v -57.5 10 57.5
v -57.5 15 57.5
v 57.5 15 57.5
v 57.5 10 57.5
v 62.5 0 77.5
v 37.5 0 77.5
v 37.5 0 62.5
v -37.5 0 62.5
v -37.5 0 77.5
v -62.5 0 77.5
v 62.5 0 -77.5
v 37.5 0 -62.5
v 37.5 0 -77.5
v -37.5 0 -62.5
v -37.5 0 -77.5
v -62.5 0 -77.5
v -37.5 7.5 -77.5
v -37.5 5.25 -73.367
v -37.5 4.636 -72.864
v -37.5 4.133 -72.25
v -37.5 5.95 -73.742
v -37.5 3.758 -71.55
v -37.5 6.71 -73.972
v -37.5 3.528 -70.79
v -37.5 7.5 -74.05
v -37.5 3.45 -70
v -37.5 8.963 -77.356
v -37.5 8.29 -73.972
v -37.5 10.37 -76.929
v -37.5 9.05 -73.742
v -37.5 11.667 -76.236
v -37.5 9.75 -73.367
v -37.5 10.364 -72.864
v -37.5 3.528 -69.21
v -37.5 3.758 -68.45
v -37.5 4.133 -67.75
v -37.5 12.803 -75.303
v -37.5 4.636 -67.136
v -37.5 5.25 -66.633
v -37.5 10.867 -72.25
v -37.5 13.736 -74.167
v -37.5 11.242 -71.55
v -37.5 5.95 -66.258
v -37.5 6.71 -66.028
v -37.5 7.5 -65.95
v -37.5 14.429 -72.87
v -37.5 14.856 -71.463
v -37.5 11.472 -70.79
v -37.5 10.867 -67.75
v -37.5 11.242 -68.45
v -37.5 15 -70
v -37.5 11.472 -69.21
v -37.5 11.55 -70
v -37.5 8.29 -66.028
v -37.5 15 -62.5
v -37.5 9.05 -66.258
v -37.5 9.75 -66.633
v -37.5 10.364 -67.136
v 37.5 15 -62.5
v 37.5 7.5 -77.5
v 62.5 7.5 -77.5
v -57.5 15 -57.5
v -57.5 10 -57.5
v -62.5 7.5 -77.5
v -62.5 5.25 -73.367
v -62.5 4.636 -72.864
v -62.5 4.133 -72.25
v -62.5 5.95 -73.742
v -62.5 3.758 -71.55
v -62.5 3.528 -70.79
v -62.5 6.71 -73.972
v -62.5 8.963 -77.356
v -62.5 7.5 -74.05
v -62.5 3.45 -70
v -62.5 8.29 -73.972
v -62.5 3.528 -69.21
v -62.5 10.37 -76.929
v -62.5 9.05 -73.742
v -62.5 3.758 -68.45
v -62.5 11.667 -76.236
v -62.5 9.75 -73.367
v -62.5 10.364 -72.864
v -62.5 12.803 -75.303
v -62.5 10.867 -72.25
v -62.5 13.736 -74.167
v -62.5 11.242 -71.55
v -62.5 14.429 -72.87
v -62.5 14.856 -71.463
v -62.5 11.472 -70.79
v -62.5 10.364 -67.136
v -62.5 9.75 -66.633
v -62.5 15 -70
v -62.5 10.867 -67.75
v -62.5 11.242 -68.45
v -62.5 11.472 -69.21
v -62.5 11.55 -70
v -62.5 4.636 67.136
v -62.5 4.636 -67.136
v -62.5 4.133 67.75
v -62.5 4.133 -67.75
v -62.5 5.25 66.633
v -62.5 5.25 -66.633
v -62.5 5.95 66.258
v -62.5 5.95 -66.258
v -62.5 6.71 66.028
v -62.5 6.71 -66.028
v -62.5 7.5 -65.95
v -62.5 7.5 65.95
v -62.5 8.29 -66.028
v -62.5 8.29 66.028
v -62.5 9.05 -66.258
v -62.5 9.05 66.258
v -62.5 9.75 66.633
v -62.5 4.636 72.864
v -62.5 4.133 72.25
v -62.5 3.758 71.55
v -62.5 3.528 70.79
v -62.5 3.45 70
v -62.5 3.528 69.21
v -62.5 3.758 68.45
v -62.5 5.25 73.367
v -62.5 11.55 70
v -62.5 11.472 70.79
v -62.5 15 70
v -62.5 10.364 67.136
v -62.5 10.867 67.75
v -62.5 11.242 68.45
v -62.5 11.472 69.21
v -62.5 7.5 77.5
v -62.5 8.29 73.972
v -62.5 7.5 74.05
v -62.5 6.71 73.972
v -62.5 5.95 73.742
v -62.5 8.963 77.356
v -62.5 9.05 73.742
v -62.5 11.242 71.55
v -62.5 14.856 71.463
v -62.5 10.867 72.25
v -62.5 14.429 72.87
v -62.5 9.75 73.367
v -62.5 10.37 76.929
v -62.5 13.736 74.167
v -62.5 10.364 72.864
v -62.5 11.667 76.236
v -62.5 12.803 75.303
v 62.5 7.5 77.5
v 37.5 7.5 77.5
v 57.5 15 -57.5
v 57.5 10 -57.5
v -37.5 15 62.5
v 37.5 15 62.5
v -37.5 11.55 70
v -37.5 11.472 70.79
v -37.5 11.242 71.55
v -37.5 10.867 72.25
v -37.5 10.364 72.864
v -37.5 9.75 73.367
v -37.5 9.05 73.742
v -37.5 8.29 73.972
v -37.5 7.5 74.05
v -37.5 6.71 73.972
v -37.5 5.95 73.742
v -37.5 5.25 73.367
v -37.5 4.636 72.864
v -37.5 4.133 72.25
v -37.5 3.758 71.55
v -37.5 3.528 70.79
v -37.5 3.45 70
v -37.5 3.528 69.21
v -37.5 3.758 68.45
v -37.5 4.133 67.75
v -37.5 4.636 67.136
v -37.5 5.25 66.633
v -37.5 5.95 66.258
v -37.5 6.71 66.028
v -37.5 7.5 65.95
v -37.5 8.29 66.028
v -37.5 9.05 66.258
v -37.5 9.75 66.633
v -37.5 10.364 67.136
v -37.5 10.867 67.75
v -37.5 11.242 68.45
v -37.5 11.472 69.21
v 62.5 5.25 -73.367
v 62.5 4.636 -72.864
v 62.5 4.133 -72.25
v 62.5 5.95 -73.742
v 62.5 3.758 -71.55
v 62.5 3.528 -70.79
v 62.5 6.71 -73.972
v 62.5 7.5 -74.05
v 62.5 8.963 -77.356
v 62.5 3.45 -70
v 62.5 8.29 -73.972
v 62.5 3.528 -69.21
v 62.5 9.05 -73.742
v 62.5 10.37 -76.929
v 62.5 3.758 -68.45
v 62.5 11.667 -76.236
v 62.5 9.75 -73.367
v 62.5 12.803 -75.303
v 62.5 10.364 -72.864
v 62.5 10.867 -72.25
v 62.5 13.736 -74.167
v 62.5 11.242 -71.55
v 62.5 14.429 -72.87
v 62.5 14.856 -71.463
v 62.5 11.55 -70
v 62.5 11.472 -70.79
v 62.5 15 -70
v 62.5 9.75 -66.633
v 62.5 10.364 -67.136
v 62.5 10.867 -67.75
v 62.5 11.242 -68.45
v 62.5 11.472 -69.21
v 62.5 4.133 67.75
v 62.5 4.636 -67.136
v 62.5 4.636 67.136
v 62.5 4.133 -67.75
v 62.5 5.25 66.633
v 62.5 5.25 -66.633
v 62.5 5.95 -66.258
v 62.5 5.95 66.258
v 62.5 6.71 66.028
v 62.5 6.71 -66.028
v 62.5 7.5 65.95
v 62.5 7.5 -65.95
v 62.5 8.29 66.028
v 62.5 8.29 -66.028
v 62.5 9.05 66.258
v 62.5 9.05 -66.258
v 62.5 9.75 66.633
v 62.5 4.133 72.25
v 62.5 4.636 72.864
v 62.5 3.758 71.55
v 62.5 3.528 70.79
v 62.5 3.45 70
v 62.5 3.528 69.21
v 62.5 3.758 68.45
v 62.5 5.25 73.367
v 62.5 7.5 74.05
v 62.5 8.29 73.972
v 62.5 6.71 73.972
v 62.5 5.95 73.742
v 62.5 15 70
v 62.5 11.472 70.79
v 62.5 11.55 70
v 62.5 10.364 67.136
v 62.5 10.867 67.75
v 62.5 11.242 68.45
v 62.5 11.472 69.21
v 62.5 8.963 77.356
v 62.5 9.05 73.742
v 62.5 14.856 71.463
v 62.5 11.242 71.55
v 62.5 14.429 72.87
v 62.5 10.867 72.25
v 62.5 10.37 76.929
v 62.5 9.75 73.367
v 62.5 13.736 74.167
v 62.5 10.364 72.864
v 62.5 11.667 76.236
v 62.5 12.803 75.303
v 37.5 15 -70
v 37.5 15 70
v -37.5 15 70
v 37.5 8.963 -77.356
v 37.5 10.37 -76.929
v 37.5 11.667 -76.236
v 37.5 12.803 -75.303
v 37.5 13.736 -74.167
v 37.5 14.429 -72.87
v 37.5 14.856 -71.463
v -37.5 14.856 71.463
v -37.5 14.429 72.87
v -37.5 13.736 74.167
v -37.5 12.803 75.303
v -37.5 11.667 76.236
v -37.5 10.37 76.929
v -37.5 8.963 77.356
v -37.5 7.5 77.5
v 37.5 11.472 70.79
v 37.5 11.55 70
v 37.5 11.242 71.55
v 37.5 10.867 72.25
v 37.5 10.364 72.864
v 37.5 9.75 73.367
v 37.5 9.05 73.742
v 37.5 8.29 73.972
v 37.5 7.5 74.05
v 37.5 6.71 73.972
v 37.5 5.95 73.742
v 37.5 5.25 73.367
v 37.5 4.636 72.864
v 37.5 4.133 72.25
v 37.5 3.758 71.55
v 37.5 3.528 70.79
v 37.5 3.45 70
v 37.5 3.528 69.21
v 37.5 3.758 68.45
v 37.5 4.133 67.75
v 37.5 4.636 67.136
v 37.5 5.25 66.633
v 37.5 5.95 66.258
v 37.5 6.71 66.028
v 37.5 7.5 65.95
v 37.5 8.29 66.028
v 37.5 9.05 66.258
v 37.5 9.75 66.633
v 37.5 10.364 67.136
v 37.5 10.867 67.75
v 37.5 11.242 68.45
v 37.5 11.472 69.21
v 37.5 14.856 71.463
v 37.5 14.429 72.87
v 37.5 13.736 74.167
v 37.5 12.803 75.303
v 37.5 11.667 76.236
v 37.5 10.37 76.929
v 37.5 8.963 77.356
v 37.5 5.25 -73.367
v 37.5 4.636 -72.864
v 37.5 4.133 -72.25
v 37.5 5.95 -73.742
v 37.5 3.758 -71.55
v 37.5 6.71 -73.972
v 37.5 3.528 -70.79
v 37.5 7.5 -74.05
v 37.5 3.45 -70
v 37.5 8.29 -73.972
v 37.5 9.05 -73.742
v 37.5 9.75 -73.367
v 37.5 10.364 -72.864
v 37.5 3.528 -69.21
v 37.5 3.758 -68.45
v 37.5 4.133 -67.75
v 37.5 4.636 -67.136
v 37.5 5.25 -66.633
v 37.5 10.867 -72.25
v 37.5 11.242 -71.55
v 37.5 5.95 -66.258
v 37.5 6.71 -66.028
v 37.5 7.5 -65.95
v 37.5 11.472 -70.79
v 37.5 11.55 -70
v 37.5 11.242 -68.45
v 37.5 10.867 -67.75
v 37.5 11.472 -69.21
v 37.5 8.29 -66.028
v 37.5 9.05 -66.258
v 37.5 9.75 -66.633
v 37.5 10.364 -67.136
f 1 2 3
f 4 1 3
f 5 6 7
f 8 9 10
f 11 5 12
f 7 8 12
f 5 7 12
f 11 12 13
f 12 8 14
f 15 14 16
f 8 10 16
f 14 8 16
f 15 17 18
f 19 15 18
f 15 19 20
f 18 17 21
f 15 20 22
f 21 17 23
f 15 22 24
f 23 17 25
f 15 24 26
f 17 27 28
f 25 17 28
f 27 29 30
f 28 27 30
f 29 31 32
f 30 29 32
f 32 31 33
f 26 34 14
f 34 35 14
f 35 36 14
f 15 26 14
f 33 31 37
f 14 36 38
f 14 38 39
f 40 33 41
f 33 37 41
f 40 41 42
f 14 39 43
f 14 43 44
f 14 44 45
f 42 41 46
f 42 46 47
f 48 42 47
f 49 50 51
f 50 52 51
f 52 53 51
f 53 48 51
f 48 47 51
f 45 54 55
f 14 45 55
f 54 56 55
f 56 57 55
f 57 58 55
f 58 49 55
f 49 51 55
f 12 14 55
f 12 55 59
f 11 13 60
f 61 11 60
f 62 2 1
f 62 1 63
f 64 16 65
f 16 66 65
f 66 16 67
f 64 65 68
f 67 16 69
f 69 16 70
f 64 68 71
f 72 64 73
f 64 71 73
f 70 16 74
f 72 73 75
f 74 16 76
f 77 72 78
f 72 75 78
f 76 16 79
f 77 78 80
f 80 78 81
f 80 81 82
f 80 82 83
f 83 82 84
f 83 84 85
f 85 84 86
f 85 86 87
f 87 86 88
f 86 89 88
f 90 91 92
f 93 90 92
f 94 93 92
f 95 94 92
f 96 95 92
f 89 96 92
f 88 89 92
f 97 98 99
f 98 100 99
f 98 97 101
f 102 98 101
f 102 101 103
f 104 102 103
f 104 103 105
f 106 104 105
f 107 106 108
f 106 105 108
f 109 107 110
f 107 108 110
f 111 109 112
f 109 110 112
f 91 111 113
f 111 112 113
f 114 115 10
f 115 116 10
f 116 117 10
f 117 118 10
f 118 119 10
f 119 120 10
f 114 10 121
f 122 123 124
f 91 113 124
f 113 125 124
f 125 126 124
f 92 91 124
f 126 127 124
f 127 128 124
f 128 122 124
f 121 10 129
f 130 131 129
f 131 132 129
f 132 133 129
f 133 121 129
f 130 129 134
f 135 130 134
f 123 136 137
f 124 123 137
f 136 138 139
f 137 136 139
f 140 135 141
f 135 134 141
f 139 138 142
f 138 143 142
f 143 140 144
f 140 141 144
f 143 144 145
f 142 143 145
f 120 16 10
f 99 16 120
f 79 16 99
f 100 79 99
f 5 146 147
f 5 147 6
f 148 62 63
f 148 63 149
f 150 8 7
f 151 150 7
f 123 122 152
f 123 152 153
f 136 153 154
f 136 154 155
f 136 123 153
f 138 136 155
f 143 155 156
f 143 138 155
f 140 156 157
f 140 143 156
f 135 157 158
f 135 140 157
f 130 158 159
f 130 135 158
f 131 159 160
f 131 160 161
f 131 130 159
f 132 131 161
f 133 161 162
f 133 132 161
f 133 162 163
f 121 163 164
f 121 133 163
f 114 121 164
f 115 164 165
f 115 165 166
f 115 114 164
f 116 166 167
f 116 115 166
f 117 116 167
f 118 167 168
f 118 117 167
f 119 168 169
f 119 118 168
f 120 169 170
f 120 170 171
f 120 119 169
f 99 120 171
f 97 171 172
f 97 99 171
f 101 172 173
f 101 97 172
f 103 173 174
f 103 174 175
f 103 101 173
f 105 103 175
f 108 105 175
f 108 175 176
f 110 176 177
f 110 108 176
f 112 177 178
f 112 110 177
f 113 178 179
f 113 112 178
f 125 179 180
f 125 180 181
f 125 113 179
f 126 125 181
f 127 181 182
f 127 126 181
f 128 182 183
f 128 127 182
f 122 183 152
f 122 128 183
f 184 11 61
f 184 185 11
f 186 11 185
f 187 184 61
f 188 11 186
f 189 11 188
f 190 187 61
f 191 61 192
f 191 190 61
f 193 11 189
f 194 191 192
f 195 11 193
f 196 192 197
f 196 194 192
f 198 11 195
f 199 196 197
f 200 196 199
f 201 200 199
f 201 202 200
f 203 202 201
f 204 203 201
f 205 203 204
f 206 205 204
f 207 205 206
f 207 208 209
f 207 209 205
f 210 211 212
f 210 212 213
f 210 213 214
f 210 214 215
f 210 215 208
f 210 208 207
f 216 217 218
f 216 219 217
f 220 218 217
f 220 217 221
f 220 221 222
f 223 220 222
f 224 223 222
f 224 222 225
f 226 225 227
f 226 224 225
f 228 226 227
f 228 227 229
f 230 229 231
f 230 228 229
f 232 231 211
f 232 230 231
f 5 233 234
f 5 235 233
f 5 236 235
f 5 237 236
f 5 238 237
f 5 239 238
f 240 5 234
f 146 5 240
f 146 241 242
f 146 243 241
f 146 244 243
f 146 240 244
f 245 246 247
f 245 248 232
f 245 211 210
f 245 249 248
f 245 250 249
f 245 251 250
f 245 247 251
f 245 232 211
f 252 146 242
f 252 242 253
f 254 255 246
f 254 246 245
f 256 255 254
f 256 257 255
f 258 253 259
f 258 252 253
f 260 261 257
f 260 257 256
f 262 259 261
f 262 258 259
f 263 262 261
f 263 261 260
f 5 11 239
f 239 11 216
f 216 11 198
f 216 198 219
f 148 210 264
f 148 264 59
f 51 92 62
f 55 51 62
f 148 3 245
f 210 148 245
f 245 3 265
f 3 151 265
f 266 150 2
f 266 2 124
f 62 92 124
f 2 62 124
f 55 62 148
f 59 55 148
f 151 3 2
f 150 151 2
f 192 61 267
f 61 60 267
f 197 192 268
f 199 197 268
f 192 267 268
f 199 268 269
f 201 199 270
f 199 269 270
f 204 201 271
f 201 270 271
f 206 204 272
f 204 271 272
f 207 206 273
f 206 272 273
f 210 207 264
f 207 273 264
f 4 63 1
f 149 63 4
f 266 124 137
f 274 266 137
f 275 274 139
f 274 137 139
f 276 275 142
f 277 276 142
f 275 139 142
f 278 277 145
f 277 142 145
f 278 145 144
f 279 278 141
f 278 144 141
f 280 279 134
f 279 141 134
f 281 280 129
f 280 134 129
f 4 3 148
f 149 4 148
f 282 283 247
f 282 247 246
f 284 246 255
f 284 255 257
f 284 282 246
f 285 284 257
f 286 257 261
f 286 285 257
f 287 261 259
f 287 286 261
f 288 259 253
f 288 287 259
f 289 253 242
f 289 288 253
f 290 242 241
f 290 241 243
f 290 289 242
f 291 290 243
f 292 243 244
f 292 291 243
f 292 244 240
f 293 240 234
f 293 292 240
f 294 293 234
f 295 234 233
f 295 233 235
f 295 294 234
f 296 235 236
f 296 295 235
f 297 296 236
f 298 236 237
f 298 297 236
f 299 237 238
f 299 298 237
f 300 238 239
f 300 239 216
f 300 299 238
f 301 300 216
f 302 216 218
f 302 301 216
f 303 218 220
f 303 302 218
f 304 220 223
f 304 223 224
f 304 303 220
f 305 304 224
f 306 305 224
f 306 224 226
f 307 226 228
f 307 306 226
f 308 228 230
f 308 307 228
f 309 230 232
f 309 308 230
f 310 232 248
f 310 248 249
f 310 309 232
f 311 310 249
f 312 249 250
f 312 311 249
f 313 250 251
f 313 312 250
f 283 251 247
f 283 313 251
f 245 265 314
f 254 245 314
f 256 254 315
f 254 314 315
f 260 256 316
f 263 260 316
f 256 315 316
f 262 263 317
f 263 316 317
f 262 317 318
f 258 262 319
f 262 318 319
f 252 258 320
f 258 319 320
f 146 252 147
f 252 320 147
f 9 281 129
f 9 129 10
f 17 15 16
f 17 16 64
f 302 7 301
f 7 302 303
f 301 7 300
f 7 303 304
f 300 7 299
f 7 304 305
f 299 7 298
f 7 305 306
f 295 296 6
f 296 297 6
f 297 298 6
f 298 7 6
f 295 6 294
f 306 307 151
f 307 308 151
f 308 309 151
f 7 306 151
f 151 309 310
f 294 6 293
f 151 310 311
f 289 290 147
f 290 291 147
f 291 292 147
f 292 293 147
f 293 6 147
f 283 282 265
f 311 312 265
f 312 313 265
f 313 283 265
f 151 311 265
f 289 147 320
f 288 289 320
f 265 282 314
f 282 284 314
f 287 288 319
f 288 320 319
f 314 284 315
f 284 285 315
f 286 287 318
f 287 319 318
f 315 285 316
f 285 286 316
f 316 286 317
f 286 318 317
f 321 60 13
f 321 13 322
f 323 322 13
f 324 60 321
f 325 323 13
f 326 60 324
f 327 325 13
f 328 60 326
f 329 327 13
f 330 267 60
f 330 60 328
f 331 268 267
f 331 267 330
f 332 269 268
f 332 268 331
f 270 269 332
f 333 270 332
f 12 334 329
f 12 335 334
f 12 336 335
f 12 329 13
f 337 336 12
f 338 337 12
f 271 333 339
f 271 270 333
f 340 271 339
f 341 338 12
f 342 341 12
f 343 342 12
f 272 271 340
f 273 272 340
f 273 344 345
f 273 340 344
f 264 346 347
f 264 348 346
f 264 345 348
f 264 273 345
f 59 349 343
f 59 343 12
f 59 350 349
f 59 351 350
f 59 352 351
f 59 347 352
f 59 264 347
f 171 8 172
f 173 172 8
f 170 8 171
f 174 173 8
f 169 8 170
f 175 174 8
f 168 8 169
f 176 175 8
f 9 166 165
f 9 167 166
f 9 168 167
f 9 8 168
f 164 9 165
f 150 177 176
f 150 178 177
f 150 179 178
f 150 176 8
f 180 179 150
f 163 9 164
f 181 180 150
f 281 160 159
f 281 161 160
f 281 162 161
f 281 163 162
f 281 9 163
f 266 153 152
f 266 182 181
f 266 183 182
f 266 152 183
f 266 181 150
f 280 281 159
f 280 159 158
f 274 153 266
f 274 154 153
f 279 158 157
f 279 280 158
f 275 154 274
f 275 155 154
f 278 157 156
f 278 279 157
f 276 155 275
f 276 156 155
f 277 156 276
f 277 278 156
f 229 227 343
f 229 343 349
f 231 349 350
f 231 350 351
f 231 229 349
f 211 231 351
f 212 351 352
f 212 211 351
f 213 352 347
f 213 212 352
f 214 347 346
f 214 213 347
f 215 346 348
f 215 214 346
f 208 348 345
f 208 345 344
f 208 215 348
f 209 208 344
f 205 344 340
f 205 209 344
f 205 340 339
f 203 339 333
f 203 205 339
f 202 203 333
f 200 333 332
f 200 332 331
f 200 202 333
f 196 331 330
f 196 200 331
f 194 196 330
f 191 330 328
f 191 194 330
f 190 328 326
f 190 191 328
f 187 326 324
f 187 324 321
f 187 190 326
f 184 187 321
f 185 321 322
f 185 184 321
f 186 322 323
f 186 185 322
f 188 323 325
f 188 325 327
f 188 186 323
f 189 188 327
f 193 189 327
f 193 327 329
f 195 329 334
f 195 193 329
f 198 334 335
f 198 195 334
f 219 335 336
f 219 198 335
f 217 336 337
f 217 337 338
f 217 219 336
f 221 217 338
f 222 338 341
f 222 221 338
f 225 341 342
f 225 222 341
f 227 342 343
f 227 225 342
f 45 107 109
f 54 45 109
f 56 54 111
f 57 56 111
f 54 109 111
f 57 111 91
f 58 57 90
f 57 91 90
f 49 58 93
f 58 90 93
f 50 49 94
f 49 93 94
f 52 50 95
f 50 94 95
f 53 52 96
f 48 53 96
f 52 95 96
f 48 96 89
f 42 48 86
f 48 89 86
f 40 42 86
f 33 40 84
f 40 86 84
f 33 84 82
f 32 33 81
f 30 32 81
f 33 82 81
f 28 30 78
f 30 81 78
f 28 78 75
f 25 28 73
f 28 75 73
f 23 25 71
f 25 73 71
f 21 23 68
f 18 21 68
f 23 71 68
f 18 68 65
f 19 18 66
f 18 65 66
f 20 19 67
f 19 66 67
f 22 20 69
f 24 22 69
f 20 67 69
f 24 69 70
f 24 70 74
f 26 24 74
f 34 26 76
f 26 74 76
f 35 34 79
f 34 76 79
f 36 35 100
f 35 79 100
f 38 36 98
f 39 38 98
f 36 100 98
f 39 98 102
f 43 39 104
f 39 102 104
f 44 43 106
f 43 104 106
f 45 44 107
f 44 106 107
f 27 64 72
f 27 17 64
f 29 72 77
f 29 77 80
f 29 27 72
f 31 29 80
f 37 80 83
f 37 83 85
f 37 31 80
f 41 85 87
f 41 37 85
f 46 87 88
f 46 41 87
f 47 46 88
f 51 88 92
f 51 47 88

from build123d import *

# Parameters (mm, degrees)
SKETCH1_W            = 125
SKETCH1_H            = 125
BOSS_EXTRUDE1_DEPTH  = 15
SKETCH2_W            = 115
SKETCH2_H            = 115
CUT_EXTRUDE1_DEPTH   = 5
SKETCH3_W            = 15
SKETCH3_H            = 15
BOSS_EXTRUDE12_DEPTH = 25
SKETCH4_R            = 4.05
CUT_EXTRUDE2_DEPTH   = 25
FILLET1_R            = 7.5
FILLET1_OF_MIRROR1_R = 7.5
MIRROR2_START        = -62.5
MIRROR2_OUTLINE_R    = 4.05
MIRROR2_DEPTH        = 25
MIRROR2_START_2      = 37.5
MIRROR2_2_OUTLINE_R  = 4.05
MIRROR2_2_DEPTH      = 25


# Read off the part's stored shape, not the designer's step: Mirror2
with BuildPart() as part:
    # Sketch1 → Boss-Extrude1 (new body)
    with BuildSketch(Plane(origin=(0, 0, 0), x_dir=(1, 0, 0), z_dir=(0, 1, 0))):
        Rectangle(SKETCH1_W, SKETCH1_H)
    extrude(amount=BOSS_EXTRUDE1_DEPTH)

    # Sketch2 → Cut-Extrude1 (cut)
    with BuildSketch(Plane(origin=(0, 15, 0), x_dir=(1, 0, 0), z_dir=(0, 1, 0))):
        Rectangle(SKETCH2_W, SKETCH2_H)
    extrude(amount=-CUT_EXTRUDE1_DEPTH, mode=Mode.SUBTRACT)

    # Sketch3 → Boss-Extrude12 (add)
    with BuildSketch(Plane.ZY.offset(62.5)):
        with Locations((-70, 7.5)):
            Rectangle(SKETCH3_W, SKETCH3_H)
    boss_extrude12 = extrude(amount=-BOSS_EXTRUDE12_DEPTH)

    # Sketch4 → Cut-Extrude2 (cut)
    with BuildSketch(Plane.ZY.offset(62.5)):
        with Locations((-70, 7.5)):
            Circle(SKETCH4_R)
    cut_extrude2 = extrude(amount=-CUT_EXTRUDE2_DEPTH, mode=Mode.SUBTRACT)

    # Fillet1
    fillet1_edges = [part.edges().sort_by_distance(p)[0] for p in [
        (-50, 15, -77.5),
    ]]
    fillet(fillet1_edges, radius=FILLET1_R)

    # Mirror1: Boss-Extrude12, Cut-Extrude2 across plane
    add(boss_extrude12.mirror(Plane(origin=(0, 0, 0), x_dir=(0, 0, 1), z_dir=(1, 0, 0))))
    add(cut_extrude2.mirror(Plane(origin=(0, 0, 0), x_dir=(0, 0, 1), z_dir=(1, 0, 0))), mode=Mode.SUBTRACT)

    # Fillet1 of Mirror1
    fillet1_of_mirror1_edges = [part.edges().sort_by_distance(p)[0] for p in [
        (50, 15, -77.5),
    ]]
    fillet(fillet1_of_mirror1_edges, radius=FILLET1_OF_MIRROR1_R)

    # Mirror2 outline → Mirror2 (add)
    with BuildSketch(Plane.YZ.offset(MIRROR2_START)):
        with BuildLine():
            Line((15, 62.5), (15, 70))
            ThreePointArc((15, 70), (12.803300859, 75.303300859), (7.5, 77.5))
            Line((7.5, 77.5), (0, 77.5))
            Line((0, 77.5), (0, 62.5))
            Line((0, 62.5), (15, 62.5))
        make_face()
        with Locations((7.5, 70)):
            Circle(MIRROR2_OUTLINE_R, mode=Mode.SUBTRACT)
    extrude(amount=MIRROR2_DEPTH)

    # Mirror2 2 outline → Mirror2 2 (add)
    with BuildSketch(Plane.YZ.offset(MIRROR2_START_2)):
        with BuildLine():
            Line((15, 62.5), (15, 70))
            ThreePointArc((15, 70), (12.803300859, 75.303300859), (7.5, 77.5))
            Line((7.5, 77.5), (0, 77.5))
            Line((0, 77.5), (0, 62.5))
            Line((0, 62.5), (15, 62.5))
        make_face()
        with Locations((7.5, 70)):
            Circle(MIRROR2_2_OUTLINE_R, mode=Mode.SUBTRACT)
    extrude(amount=MIRROR2_2_DEPTH)


solid = part.part
